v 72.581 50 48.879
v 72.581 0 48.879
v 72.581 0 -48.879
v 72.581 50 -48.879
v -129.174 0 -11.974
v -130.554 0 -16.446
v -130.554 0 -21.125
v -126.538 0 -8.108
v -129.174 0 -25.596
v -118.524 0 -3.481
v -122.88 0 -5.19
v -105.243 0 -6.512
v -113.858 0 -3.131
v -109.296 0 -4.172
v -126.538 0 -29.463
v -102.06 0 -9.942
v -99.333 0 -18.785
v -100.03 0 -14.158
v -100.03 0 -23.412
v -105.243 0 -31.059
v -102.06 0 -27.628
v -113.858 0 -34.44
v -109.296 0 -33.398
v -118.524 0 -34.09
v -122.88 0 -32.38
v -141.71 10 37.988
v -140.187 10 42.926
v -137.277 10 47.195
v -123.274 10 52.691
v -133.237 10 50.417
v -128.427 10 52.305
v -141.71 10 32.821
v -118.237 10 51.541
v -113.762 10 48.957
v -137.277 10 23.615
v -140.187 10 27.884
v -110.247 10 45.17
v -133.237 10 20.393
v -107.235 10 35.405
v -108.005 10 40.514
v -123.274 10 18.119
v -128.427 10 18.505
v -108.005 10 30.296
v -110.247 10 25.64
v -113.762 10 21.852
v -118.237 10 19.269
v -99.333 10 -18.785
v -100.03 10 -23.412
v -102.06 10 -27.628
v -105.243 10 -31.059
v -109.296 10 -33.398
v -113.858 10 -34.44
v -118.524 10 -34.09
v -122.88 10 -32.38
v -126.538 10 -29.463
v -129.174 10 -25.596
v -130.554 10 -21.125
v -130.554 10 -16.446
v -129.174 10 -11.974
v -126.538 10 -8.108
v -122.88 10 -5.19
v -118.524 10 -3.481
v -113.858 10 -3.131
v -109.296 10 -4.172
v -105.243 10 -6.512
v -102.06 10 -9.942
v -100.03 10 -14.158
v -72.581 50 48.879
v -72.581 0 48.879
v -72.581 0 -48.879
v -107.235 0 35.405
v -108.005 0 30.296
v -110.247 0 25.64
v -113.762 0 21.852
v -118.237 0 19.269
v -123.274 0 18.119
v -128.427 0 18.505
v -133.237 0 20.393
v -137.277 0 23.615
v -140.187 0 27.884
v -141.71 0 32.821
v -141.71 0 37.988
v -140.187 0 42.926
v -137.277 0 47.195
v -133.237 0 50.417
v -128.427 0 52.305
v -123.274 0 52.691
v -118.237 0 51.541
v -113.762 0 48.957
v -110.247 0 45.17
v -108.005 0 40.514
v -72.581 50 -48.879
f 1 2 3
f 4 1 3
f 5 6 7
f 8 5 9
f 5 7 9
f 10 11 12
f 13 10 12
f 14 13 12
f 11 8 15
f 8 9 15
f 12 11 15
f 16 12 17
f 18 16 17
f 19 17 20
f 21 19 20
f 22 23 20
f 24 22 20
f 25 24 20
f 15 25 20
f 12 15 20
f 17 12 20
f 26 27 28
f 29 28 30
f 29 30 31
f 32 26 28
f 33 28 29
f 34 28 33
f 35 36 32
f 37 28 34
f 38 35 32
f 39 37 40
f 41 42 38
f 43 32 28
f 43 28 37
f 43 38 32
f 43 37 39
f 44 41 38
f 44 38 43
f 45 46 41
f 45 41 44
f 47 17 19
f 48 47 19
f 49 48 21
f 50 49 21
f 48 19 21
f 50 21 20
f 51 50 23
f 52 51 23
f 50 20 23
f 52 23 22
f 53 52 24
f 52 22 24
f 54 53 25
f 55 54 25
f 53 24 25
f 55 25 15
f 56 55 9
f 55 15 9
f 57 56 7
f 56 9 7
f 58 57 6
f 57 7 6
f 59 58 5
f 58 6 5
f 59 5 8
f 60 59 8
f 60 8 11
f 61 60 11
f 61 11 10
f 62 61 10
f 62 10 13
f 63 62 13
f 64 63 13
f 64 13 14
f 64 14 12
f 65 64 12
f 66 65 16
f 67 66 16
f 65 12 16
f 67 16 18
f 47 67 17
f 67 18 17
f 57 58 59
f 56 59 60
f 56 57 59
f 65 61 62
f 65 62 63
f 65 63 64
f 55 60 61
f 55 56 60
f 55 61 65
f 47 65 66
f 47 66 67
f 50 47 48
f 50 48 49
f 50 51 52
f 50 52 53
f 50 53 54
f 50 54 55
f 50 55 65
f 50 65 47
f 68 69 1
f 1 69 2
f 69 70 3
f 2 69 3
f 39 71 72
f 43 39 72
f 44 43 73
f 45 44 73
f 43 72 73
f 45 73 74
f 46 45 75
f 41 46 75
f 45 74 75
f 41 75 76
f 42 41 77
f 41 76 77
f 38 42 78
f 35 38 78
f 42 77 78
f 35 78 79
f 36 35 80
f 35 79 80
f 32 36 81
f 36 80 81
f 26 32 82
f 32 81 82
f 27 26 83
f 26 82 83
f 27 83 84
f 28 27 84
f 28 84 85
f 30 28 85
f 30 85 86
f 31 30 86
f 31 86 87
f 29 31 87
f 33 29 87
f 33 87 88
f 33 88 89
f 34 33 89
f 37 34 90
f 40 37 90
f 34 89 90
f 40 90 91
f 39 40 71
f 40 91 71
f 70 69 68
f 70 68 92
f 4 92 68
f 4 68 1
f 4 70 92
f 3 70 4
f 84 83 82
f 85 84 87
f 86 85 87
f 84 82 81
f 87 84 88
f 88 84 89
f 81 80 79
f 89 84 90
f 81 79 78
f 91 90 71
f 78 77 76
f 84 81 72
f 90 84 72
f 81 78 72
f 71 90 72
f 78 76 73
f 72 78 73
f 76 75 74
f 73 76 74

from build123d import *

# Parameters (mm, degrees)
SKETCH_1_W      = 145.162550348
SKETCH_1_H      = 97.757068038
EXTRUDE_1_DEPTH = 50
SKETCH_2_R      = 15.69817808
EXTRUDE_2_DEPTH = 10
SKETCH_3_R      = 17.334319562
EXTRUDE_3_DEPTH = 10


with BuildPart() as part:
    # 草图1 → 凸台-拉伸1 (new body)
    with BuildSketch(Plane(origin=(0, 0, 0), x_dir=(1, 0, 0), z_dir=(0, 1, 0))):
        Rectangle(SKETCH_1_W, SKETCH_1_H)
    extrude(amount=EXTRUDE_1_DEPTH)


with BuildPart() as body_2:
    # 草图2 → 凸台-拉伸2 (new body)
    with BuildSketch(Plane(origin=(0, 0, 0), x_dir=(1, 0, 0), z_dir=(0, 1, 0))):
        with Locations((-115.030740926, 18.785262127)):
            Circle(SKETCH_2_R)
    extrude(amount=EXTRUDE_2_DEPTH)


with BuildPart() as body_3:
    # 草图3 → 凸台-拉伸3 (new body)
    with BuildSketch(Plane(origin=(0, 0, 0), x_dir=(1, 0, 0), z_dir=(0, 1, 0))):
        with Locations((-124.569592284, -35.404894456)):
            Circle(SKETCH_3_R)
    extrude(amount=EXTRUDE_3_DEPTH)


solid = Compound([part.part, body_2.part, body_3.part])
